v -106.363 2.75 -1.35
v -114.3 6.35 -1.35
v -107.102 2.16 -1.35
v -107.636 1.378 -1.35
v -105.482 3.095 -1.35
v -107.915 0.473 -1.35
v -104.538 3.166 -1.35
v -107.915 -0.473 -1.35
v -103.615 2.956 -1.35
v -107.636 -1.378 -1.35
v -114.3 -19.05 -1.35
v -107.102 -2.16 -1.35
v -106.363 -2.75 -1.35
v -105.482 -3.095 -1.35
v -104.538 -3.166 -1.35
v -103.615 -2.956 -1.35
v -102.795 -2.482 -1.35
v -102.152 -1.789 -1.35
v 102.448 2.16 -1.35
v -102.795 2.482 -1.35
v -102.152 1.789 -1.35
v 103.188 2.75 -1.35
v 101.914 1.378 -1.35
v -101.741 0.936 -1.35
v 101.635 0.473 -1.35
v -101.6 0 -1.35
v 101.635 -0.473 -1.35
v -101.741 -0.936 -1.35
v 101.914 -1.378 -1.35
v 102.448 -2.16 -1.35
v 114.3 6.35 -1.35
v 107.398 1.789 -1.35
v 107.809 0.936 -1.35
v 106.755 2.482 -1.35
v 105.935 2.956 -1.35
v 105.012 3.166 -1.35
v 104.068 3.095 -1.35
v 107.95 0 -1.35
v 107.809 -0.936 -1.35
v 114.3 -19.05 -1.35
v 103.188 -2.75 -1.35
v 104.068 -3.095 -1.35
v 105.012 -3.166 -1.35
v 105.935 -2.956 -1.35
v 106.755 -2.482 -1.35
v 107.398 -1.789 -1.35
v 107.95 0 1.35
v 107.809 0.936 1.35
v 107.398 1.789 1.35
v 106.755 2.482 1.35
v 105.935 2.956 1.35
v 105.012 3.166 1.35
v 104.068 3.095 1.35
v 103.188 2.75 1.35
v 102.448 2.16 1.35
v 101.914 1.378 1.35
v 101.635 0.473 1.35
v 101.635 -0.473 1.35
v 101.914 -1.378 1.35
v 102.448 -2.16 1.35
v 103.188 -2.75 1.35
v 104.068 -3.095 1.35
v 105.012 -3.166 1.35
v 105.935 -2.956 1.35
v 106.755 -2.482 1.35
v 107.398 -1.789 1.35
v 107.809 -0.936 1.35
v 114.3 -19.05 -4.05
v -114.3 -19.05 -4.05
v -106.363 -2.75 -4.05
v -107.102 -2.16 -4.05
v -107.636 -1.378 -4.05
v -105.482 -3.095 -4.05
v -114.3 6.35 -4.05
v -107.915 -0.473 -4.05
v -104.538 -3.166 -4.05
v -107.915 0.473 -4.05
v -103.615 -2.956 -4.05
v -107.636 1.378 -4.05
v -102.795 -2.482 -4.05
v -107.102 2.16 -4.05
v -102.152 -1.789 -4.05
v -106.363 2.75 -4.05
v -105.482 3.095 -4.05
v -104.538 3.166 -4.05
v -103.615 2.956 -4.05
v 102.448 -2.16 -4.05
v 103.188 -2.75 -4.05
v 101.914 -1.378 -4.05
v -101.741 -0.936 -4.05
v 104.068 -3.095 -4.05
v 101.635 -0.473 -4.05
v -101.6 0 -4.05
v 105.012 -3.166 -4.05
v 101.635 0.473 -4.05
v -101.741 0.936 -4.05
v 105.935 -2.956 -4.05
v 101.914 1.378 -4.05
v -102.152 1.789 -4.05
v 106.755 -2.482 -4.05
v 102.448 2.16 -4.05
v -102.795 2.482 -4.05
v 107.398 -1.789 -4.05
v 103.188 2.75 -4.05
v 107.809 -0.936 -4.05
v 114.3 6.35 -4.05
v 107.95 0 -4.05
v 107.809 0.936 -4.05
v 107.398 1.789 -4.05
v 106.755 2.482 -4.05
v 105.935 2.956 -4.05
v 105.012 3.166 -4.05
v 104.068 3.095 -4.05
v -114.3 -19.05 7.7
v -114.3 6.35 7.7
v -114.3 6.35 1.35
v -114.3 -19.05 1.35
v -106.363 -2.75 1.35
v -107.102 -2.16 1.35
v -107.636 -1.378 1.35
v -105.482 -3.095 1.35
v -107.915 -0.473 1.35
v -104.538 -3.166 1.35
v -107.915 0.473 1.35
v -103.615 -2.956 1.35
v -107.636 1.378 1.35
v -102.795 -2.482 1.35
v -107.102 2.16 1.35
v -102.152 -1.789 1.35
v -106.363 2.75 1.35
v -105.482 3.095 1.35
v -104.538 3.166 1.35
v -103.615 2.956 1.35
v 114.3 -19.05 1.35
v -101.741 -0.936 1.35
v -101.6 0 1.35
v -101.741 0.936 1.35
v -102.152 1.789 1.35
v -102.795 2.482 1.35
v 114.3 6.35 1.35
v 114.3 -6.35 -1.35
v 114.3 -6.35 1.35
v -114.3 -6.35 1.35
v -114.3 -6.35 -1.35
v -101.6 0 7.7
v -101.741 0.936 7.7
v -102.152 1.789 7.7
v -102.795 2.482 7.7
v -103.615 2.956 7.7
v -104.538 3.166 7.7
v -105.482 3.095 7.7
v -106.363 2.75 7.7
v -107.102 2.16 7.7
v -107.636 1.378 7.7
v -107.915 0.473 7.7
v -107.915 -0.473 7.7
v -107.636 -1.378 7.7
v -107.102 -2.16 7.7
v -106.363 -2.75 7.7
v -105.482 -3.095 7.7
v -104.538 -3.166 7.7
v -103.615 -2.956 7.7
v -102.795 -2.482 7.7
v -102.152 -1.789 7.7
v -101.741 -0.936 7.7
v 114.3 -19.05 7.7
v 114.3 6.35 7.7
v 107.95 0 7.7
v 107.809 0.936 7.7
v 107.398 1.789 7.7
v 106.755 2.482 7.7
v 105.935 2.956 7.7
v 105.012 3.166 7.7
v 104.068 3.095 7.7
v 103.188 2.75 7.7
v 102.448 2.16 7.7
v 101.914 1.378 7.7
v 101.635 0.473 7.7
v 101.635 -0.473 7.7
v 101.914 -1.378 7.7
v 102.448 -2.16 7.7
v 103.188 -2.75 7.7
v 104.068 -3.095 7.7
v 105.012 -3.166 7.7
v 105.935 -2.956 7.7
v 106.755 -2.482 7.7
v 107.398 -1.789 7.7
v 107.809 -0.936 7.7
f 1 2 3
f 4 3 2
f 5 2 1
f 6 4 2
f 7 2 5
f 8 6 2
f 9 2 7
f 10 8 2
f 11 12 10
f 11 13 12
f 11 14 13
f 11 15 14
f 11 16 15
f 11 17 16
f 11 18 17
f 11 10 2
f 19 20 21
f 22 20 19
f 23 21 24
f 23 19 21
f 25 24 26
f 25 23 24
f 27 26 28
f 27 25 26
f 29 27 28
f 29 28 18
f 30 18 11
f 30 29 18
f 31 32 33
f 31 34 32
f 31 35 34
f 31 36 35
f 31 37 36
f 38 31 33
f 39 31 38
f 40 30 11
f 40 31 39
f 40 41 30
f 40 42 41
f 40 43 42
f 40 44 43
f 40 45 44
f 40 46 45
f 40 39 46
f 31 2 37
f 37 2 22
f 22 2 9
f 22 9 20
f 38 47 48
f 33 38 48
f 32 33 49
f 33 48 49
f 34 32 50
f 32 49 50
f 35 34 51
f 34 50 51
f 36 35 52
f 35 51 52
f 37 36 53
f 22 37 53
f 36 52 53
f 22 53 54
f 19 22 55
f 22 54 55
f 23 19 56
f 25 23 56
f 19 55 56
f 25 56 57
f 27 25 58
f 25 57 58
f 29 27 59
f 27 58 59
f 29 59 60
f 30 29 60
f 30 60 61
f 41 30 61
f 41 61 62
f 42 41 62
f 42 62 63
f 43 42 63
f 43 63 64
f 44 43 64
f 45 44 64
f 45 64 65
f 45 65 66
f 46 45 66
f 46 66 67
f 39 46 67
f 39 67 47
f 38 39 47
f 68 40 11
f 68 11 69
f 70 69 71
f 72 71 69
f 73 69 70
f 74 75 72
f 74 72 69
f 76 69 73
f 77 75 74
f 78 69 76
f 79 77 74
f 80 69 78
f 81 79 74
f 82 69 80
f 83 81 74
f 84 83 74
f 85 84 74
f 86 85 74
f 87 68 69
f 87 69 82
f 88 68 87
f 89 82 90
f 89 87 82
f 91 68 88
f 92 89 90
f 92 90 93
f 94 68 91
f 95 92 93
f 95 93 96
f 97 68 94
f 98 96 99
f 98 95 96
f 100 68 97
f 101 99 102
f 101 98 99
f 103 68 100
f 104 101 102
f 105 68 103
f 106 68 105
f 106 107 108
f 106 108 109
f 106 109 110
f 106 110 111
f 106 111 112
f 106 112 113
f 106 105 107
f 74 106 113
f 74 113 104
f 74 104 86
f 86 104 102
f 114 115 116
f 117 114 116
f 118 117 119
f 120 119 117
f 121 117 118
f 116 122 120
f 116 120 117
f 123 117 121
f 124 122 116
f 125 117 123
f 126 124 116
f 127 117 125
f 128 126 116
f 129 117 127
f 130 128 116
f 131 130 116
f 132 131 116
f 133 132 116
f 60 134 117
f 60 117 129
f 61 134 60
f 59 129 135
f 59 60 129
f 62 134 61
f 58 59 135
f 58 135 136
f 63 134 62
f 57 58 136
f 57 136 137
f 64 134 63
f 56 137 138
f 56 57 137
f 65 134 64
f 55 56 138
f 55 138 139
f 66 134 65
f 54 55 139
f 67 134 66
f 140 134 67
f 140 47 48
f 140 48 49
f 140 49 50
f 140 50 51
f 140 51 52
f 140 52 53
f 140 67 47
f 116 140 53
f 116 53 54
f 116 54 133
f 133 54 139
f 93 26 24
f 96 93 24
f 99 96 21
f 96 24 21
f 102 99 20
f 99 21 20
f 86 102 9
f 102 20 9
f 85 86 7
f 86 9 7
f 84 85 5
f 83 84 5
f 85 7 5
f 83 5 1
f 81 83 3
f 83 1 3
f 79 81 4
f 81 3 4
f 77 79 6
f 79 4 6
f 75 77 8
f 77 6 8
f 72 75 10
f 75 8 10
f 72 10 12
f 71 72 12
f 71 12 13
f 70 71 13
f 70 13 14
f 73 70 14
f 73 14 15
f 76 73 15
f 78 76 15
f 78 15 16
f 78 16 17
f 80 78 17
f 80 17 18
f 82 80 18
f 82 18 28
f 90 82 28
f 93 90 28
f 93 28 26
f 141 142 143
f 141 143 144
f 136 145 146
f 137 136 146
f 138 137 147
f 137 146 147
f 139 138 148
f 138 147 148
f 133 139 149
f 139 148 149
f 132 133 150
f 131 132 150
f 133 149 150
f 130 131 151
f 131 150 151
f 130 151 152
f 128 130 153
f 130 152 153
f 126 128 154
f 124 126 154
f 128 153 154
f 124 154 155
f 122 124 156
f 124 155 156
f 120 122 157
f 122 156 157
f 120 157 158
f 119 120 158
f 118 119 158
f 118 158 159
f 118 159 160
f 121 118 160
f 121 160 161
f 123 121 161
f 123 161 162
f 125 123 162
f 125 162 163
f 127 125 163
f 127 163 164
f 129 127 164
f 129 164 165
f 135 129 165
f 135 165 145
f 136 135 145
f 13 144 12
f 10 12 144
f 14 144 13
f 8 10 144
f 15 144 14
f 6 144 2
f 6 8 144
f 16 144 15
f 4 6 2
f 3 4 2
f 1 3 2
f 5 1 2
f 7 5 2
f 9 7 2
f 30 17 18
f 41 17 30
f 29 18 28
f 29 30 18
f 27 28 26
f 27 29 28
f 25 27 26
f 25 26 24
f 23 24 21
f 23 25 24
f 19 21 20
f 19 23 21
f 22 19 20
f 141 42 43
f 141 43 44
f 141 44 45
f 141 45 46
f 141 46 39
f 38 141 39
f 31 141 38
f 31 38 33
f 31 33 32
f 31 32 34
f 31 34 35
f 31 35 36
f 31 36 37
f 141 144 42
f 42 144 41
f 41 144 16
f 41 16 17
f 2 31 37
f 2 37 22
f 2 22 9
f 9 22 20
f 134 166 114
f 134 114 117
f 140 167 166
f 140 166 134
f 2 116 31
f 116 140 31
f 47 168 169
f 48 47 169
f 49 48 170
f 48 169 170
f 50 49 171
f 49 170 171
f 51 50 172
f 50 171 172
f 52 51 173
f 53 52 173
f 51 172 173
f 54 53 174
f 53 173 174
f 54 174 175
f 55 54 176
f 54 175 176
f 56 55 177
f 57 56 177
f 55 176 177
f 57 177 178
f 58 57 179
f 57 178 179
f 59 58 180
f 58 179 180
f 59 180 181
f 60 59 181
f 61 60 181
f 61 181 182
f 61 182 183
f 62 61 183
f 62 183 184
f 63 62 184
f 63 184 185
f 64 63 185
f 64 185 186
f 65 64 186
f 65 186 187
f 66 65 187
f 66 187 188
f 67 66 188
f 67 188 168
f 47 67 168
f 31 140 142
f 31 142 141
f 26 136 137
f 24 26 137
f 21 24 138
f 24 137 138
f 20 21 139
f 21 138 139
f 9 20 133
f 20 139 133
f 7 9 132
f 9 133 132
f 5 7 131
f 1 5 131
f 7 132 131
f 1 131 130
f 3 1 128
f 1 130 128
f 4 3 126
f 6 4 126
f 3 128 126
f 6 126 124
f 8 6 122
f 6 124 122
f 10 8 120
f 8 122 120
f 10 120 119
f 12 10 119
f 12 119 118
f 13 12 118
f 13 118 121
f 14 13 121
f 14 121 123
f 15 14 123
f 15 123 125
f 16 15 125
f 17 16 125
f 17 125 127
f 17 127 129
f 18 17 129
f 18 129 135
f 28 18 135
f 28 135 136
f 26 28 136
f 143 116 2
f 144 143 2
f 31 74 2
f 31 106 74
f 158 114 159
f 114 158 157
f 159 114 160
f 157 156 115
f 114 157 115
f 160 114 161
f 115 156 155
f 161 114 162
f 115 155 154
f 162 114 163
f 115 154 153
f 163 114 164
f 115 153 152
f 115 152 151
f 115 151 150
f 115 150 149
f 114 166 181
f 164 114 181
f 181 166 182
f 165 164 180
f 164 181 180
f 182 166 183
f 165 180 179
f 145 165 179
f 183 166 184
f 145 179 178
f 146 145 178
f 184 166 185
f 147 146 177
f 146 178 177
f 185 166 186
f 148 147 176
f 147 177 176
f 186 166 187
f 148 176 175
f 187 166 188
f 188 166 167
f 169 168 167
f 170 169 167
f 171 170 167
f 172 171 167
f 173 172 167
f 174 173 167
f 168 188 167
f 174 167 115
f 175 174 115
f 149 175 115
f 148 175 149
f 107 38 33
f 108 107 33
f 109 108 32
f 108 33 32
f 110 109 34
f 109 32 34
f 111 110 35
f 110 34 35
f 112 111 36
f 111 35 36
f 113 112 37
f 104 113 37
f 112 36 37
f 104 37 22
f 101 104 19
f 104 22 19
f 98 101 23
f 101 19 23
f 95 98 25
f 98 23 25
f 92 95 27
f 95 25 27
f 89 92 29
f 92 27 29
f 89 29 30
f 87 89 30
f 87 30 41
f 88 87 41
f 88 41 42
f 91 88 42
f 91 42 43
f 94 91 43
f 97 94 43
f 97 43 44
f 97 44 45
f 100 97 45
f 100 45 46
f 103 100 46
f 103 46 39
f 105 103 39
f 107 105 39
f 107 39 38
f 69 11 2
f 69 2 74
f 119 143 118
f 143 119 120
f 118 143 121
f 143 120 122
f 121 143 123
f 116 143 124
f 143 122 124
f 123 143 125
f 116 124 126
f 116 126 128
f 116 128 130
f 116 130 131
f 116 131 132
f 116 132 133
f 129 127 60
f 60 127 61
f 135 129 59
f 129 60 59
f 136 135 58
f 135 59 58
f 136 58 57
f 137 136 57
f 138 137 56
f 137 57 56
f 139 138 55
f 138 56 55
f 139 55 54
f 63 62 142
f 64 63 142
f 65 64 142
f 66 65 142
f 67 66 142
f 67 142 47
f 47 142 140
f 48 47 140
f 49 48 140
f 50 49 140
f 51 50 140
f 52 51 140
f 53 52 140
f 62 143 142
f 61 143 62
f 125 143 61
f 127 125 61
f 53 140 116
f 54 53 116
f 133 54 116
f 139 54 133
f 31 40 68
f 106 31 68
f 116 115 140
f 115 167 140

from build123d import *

# Parameters (mm, degrees)
SKETCH2_W           = 6.35
SKETCH2_H           = 25.4
BOSS_EXTRUDE1_DEPTH = 114.3
SKETCH2_4_W         = 2.7
SKETCH2_4_H         = 12.7
BOSS_EXTRUDE2_DEPTH = 114.3
BOSS_EXTRUDE3_DEPTH = 114.3
SKETCH4_R           = 3.175
CUT_EXTRUDE4_DEPTH  = 11.75


with BuildPart() as part:
    # Sketch2 → Boss-Extrude1 (new body, symmetric)
    with BuildSketch(Plane(origin=(0, 0, 0), x_dir=(0, 0, -1), z_dir=(1, 0, 0))):
        with Locations((-4.525, -6.35)):
            Rectangle(SKETCH2_W, SKETCH2_H)
    extrude(amount=BOSS_EXTRUDE1_DEPTH, both=True)


with BuildPart() as body_2:
    # Sketch2<4> → Boss-Extrude2 (new body, symmetric)
    with BuildSketch(Plane(origin=(0, 0, 0), x_dir=(0, 0, -1), z_dir=(1, 0, 0))):
        Rectangle(SKETCH2_4_W, SKETCH2_4_H)
    extrude(amount=BOSS_EXTRUDE2_DEPTH, both=True)


with BuildPart() as body_3:
    # Sketch2<5> → Boss-Extrude3 (new body, symmetric)
    with BuildSketch(Plane(origin=(0, 0, 0), x_dir=(0, 0, -1), z_dir=(1, 0, 0))):
        Polygon((4.05, 6.35), (1.35, 6.35), (1.35, -6.35), (1.35, -19.05), (4.05, -19.05), align=None)
    extrude(amount=BOSS_EXTRUDE3_DEPTH, both=True)


with BuildPart() as cut_extrude4_tool:
    # Sketch4 → Cut-Extrude4 (new body)
    with BuildSketch(Plane.XY.offset(7.7)):
        with Locations((-104.775, 0)):
            Circle(SKETCH4_R)
        with Locations((104.775, 0)):
            Circle(SKETCH4_R)
    extrude(amount=-CUT_EXTRUDE4_DEPTH)


with BuildPart() as part_1:
    add(part.part)

    # Cut-Extrude4: cut by cut_extrude4_tool
    add(cut_extrude4_tool.part, mode=Mode.SUBTRACT)


with BuildPart() as body_2_1:
    add(body_2.part)

    # Cut-Extrude4: cut by cut_extrude4_tool
    add(cut_extrude4_tool.part, mode=Mode.SUBTRACT)


with BuildPart() as body_3_1:
    add(body_3.part)

    # Cut-Extrude4: cut by cut_extrude4_tool
    add(cut_extrude4_tool.part, mode=Mode.SUBTRACT)


solid = Compound([part_1.part, body_2_1.part, body_3_1.part])
